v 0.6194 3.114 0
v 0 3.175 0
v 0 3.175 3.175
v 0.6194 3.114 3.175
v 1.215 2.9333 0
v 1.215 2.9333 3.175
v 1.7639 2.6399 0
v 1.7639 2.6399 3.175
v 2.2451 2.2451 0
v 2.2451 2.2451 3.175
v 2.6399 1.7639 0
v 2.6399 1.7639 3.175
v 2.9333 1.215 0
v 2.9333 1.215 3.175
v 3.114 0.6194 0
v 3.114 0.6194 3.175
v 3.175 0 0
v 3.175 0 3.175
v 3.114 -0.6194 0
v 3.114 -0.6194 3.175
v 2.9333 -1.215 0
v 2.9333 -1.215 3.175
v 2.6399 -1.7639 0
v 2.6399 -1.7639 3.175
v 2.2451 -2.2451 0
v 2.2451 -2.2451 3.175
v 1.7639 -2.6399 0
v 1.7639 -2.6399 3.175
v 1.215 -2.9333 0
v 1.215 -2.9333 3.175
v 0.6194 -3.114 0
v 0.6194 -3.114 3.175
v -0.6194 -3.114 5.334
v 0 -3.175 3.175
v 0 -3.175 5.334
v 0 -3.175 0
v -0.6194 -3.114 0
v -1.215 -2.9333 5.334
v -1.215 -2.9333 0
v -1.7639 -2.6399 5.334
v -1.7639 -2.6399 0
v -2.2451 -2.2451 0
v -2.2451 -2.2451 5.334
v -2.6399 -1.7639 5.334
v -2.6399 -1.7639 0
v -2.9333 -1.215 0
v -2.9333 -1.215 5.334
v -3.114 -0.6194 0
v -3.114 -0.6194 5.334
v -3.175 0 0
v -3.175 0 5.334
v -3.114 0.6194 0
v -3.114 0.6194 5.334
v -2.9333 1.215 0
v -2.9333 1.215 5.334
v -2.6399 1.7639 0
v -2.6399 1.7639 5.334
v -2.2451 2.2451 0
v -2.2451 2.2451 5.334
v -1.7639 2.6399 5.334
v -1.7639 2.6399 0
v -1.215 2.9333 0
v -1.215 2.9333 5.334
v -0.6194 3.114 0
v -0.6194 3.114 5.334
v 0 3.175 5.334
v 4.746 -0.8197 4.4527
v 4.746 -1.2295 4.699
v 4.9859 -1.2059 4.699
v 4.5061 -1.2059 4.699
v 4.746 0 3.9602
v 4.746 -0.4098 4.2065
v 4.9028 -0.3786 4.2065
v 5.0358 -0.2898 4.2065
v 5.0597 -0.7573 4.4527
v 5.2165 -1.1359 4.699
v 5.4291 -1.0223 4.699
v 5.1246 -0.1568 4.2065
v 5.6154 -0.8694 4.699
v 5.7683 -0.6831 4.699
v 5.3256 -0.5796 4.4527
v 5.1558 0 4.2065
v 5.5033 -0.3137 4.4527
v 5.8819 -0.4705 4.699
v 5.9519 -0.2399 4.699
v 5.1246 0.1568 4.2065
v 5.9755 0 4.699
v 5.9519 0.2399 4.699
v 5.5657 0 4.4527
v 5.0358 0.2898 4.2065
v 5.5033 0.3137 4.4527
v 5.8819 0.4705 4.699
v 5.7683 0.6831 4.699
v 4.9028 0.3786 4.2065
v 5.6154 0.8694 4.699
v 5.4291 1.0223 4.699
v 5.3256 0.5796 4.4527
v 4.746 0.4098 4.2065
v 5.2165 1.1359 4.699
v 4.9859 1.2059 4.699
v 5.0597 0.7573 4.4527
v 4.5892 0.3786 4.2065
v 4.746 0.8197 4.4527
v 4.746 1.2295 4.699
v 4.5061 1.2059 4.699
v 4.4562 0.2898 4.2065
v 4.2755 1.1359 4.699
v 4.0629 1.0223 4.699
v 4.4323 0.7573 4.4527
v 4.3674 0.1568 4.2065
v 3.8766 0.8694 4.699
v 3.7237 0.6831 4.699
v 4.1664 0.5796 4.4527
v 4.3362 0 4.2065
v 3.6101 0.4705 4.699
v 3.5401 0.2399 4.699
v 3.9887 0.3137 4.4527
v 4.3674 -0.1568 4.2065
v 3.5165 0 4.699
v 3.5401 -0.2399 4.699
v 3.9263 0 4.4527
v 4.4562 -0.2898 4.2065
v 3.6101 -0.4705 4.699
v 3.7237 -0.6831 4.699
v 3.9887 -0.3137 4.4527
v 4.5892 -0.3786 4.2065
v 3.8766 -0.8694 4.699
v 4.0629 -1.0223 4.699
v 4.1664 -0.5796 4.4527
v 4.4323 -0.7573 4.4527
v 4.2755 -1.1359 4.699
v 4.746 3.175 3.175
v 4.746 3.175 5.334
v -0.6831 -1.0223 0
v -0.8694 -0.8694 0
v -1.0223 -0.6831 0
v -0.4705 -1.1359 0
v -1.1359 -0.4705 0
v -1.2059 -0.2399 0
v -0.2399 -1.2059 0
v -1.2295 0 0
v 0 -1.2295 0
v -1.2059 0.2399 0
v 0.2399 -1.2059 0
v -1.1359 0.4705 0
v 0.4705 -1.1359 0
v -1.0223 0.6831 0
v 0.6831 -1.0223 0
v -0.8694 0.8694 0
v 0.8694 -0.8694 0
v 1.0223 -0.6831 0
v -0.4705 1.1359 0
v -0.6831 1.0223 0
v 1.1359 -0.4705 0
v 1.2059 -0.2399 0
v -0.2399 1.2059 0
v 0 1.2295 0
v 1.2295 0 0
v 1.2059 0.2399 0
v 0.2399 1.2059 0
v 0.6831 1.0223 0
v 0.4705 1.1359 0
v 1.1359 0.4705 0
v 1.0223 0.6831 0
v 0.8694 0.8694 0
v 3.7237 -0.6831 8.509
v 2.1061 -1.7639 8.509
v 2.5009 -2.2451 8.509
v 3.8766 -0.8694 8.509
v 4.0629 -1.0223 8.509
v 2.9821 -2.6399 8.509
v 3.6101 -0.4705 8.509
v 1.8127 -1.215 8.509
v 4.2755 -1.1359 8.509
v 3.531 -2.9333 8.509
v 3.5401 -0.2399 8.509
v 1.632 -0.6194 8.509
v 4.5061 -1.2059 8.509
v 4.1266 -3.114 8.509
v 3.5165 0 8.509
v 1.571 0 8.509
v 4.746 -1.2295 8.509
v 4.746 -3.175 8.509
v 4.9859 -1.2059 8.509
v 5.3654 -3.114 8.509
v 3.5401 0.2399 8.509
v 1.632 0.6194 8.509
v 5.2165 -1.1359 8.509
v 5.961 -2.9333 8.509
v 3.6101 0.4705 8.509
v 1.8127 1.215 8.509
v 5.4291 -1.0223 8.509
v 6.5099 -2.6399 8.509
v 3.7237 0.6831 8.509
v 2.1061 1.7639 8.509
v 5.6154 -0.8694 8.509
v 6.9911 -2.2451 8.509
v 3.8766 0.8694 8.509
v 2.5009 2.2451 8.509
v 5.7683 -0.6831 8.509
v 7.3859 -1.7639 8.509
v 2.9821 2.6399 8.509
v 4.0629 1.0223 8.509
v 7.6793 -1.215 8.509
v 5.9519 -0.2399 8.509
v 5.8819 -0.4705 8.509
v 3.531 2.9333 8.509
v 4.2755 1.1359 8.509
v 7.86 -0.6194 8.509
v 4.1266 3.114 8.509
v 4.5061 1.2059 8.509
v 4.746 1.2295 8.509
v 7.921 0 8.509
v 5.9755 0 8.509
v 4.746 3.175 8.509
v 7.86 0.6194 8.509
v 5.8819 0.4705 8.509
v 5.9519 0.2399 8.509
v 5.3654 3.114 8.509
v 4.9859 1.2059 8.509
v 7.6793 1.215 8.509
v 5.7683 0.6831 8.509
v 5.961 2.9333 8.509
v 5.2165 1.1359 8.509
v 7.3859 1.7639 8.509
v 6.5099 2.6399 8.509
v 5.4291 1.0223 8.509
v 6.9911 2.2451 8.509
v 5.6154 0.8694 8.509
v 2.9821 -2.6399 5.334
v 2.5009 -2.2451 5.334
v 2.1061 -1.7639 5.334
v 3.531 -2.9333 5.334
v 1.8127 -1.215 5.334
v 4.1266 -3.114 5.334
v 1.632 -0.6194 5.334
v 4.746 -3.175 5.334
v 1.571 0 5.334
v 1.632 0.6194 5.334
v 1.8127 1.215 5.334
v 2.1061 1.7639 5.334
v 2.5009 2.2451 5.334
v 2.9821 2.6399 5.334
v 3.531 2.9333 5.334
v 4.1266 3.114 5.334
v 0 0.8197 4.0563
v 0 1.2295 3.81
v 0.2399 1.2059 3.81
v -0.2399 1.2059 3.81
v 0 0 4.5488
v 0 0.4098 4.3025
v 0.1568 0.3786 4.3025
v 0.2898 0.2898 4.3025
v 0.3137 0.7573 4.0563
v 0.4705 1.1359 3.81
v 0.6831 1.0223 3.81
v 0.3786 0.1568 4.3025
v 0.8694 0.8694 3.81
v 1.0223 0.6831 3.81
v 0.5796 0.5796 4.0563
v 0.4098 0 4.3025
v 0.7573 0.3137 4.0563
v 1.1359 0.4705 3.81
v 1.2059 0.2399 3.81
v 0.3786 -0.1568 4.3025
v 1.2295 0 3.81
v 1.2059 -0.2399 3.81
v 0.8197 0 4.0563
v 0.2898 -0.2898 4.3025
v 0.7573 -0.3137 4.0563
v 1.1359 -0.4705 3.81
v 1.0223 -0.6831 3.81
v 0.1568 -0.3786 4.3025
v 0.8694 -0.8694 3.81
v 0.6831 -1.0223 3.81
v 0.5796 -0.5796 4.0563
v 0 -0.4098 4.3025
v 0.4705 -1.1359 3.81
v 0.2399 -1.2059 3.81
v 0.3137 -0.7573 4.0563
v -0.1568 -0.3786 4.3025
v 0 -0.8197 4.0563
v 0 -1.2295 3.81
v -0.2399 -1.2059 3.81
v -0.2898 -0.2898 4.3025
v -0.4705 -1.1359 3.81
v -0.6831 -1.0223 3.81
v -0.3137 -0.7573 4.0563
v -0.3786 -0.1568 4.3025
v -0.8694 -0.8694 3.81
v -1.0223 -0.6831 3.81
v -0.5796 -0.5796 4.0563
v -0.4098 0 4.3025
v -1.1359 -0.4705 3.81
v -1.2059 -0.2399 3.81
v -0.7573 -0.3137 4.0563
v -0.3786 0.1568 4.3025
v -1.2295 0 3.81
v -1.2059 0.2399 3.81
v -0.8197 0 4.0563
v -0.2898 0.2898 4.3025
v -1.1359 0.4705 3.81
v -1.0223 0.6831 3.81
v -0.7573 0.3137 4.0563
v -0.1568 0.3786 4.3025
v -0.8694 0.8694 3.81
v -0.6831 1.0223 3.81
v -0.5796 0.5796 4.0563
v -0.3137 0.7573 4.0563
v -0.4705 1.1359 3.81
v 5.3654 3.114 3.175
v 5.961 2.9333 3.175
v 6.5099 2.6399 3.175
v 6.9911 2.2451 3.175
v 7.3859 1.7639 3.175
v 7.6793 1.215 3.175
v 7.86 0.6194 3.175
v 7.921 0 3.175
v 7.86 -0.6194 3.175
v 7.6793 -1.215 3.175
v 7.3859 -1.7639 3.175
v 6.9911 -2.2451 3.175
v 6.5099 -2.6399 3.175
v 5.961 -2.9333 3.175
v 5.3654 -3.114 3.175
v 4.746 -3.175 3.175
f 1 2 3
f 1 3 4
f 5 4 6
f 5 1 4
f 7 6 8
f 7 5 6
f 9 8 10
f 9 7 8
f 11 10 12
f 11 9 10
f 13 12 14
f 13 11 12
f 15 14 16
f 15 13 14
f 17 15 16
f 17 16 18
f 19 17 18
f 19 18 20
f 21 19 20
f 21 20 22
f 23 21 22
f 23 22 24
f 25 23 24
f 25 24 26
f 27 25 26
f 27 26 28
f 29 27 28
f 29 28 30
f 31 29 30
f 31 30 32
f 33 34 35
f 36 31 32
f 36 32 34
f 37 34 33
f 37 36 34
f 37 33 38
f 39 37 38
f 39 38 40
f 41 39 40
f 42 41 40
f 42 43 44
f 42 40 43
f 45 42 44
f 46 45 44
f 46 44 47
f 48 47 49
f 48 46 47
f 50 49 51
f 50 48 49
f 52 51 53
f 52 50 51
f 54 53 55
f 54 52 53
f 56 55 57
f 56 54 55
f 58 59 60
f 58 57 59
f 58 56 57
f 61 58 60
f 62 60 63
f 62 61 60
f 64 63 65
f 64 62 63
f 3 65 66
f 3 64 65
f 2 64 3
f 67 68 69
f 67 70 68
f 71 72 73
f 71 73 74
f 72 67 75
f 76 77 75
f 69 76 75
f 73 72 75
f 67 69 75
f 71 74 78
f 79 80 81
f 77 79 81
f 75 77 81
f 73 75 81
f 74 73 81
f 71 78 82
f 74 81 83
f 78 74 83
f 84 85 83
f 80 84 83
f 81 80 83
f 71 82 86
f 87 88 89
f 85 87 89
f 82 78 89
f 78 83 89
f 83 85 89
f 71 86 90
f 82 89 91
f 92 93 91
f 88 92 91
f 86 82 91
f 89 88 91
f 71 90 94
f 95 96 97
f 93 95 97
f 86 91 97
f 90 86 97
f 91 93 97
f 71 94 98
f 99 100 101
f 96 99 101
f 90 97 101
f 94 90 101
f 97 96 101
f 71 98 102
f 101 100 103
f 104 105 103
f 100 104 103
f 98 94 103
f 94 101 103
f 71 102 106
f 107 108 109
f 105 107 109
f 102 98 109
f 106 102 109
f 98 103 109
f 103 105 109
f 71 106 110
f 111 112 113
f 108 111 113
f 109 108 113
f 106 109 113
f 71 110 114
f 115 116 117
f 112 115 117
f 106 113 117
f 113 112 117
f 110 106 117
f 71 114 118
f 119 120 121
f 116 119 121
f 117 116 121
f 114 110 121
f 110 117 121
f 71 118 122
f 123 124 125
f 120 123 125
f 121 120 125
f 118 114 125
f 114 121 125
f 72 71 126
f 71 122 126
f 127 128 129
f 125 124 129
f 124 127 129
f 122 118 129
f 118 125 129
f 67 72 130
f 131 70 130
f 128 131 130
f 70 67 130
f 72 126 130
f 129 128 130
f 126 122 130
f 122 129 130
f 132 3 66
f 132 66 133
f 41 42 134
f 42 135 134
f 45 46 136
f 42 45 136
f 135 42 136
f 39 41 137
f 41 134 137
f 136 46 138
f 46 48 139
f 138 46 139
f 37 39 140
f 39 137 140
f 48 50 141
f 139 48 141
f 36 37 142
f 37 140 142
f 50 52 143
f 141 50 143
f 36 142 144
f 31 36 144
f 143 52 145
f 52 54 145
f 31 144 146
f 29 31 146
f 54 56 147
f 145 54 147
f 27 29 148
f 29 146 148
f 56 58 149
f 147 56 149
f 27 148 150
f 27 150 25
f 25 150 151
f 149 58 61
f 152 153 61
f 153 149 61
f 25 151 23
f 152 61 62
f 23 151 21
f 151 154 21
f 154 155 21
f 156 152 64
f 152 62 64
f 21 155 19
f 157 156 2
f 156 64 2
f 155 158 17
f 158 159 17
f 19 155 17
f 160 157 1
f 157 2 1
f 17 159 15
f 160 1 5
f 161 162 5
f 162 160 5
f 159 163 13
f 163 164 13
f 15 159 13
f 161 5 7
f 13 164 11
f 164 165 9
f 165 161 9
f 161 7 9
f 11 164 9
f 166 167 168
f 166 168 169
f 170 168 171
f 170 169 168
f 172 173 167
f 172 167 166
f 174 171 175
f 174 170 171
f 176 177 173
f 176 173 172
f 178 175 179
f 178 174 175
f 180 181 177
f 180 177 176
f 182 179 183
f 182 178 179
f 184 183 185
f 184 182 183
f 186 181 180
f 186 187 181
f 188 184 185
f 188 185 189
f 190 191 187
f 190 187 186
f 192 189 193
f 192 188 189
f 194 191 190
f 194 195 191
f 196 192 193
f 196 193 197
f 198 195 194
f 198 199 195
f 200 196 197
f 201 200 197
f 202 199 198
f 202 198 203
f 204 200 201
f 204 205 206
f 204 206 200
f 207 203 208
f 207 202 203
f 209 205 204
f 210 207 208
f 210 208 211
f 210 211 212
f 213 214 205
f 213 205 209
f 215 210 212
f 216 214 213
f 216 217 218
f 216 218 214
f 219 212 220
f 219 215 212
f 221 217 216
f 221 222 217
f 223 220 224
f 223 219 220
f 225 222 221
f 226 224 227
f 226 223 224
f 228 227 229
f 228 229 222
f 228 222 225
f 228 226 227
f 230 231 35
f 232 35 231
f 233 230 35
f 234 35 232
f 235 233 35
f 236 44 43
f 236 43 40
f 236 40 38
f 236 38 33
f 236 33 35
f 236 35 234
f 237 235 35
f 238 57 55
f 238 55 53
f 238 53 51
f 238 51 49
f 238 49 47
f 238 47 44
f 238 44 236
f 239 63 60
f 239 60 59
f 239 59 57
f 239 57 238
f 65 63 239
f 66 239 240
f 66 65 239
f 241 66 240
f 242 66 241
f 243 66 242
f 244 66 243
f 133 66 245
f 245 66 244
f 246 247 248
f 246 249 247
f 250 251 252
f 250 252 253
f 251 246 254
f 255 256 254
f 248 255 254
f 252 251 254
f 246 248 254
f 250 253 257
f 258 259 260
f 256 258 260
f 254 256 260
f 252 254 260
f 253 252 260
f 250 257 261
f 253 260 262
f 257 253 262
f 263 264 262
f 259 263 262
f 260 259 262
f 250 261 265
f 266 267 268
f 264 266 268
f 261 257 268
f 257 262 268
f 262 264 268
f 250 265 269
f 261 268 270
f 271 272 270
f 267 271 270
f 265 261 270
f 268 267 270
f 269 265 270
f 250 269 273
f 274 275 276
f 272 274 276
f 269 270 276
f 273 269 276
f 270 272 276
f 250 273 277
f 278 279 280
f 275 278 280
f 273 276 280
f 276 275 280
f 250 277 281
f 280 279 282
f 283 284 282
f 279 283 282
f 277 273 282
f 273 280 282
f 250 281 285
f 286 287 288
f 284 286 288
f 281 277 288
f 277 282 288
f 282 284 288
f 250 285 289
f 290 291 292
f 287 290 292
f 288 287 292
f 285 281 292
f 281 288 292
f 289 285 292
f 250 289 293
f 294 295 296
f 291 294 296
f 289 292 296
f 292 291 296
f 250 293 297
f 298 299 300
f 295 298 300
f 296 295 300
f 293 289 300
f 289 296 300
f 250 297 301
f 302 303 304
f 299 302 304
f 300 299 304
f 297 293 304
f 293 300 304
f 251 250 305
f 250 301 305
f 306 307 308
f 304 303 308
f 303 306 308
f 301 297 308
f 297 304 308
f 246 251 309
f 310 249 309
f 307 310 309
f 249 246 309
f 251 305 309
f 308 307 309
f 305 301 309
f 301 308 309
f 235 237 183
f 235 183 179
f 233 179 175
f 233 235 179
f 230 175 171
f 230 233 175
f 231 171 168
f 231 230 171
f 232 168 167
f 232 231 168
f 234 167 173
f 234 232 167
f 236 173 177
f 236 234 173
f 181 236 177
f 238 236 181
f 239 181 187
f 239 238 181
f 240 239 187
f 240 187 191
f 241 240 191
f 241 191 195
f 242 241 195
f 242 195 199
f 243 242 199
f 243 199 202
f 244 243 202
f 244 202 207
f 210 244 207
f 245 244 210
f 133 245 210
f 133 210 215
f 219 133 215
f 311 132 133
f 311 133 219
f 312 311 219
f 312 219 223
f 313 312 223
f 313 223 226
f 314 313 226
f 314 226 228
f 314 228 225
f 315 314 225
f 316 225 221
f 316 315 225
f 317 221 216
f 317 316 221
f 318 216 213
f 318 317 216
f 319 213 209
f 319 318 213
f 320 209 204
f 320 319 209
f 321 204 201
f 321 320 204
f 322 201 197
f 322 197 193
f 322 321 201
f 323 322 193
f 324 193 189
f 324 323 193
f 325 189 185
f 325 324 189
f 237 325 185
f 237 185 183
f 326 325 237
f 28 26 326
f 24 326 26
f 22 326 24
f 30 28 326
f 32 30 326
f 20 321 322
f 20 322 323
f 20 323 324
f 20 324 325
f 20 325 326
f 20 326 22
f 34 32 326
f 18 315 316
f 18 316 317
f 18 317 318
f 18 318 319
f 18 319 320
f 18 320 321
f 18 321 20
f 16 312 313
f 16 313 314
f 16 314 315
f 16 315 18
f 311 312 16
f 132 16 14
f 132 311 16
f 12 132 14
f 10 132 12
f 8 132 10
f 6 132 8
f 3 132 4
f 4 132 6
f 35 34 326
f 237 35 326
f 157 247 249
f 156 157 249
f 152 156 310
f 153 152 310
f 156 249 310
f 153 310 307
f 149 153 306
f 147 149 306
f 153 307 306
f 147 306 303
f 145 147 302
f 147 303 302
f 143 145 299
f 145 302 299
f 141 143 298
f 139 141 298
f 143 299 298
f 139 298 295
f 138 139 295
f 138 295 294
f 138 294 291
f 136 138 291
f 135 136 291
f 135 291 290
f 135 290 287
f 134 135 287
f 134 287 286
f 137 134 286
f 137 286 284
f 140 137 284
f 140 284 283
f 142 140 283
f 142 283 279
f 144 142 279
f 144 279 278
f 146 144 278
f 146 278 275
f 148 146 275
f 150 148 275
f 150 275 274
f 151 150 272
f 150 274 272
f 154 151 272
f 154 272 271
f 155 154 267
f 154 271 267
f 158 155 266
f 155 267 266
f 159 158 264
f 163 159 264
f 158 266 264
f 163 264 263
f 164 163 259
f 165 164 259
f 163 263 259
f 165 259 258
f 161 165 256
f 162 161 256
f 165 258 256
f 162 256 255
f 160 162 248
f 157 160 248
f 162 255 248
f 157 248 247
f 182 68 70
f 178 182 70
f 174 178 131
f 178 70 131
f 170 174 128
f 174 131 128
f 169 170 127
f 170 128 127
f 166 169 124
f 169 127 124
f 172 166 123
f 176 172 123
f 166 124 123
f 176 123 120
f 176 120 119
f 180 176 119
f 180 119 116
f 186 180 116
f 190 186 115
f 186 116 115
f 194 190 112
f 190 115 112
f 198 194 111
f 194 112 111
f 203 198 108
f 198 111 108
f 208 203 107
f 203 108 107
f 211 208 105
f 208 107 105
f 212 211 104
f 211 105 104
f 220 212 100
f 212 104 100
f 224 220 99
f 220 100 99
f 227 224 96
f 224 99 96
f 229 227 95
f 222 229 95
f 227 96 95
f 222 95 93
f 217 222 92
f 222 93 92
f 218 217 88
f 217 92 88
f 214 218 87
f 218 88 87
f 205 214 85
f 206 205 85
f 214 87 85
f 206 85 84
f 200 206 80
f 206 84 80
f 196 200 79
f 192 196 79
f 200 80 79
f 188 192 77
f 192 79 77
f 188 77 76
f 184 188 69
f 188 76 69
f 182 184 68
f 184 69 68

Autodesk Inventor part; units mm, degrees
ref_plane "YZ Plane" through (0, 0, 0) normal (1, 0, 0) x (0, 1, 0)
ref_plane "XZ Plane" through (0, 0, 0) normal (0, 1, 0) x (-1, 0, 0)
ref_plane "XY Plane" through (0, 0, 0) normal (0, 0, 1) x (1, 0, 0)
sketch "Sketch2" plane through (0, 0, 0) normal (0, 0, 1) x (1, 0, 0)
  arc A0 (4.746, -3.175) -> (4.746, 3.175) centre (4.746, 0) ccw
  arc A1 (0, 3.175) -> (0, -3.175) centre (0, 0) ccw
  line L0 (0, 3.175) -> (4.746, 3.175)
  line L1 (0, -3.175) -> (4.746, -3.175)
  dimension "d14" = 6.35
  dimension "d15" = 6.35
  dimension "d16" = 0
  dimension "d17" = 0
  dimension "d18" = 4.746
  dimension "d19" = 0
extrude "Extrusion2" add sketch "Sketch2" along normal blind 8.509
sketch "Sketch3" plane through (0, 0, 8.509) normal (0, 0, 1) x (1, 0, 0)
  arc A0 (4.746, -3.175) -> (4.746, 3.175) centre (4.746, 0) ccw projected
  arc A1 (4.746, -3.175) -> (4.746, 3.175) centre (4.746, 0) ccw projected
  point P0 (0, 0)
  point P1 (7.921, 0)
  dimension "d22" = 4.746
  dimension "d23" = 0
  dimension "d44" = 3.175
hole "Hole1" at (4.746, 0, 8.509) direction (0, 0, -1) diameter 2.459 depth 3.81 tip angle 118 thread size "M3x0.5" class "6H" standard "ISO Metric profile"
sketch "Sketch4" plane through (0, 0, 0) normal (0, 0, -1) x (-1, 0, 0)
  point P0 (0, 0)
hole "Hole2" at (0, 0, 0) direction (0, 0, 1) diameter 2.459 depth 3.81 tip angle 118 thread size "M3x0.5" class "6H" standard "ISO Metric profile"
sketch "Sketch5" plane through (0, 0, 0) normal (0, 0, -1) x (-1, 0, 0)
  arc A0 (-4.746, 3.175) -> (-4.746, -3.175) centre (-4.746, 0) ccw
  arc A1 (0, 3.175) -> (0, -3.175) centre (0, 0) ccw
  line L0 (0, 3.175) -> (-4.746, 3.175)
  arc A2 (0, -3.175) -> (0, 3.175) centre (0, 0) ccw projected
  line L1 (0, -3.175) -> (-4.746, -3.175)
  dimension "d42" = 4.746
extrude "Extrusion3" cut sketch "Sketch5" against normal blind 3.175 from surface at 0 contours L0 A1 L1 A0
sketch "Sketch11" plane through (0, 0, 8.509) normal (0, 0, 1) x (1, 0, 0)
  arc A0 (0, 3.175) -> (0, -3.175) centre (0, 0) ccw
  arc A1 (4.746, -3.175) -> (4.746, 3.175) centre (4.746, 0) ccw projected
  arc A2 (4.746, 3.175) -> (4.746, -3.175) centre (4.746, 0) ccw
  line L0 (0, 3.175) -> (4.746, 3.175)
  line L1 (4.746, -3.175) -> (0, -3.175)
sketch "Sketch11 outline for Extrusion5" plane through (0, 0, 8.509) normal (0, 0, 1) x (1, 0, 0)
  arc A0 (4.746, -3.175) -> (4.746, 3.175) centre (4.746, 0) cw
  line L0 (0, -3.175) -> (4.746, -3.175)
  arc A1 (0, 3.175) -> (0, -3.175) centre (0, 0) ccw
  line L1 (4.746, 3.175) -> (0, 3.175)
extrude "Extrusion5" cut sketch "Sketch11 outline for Extrusion5" against normal blind 3.175
properties part number "PC104_EM-113 standoff_4.746"
